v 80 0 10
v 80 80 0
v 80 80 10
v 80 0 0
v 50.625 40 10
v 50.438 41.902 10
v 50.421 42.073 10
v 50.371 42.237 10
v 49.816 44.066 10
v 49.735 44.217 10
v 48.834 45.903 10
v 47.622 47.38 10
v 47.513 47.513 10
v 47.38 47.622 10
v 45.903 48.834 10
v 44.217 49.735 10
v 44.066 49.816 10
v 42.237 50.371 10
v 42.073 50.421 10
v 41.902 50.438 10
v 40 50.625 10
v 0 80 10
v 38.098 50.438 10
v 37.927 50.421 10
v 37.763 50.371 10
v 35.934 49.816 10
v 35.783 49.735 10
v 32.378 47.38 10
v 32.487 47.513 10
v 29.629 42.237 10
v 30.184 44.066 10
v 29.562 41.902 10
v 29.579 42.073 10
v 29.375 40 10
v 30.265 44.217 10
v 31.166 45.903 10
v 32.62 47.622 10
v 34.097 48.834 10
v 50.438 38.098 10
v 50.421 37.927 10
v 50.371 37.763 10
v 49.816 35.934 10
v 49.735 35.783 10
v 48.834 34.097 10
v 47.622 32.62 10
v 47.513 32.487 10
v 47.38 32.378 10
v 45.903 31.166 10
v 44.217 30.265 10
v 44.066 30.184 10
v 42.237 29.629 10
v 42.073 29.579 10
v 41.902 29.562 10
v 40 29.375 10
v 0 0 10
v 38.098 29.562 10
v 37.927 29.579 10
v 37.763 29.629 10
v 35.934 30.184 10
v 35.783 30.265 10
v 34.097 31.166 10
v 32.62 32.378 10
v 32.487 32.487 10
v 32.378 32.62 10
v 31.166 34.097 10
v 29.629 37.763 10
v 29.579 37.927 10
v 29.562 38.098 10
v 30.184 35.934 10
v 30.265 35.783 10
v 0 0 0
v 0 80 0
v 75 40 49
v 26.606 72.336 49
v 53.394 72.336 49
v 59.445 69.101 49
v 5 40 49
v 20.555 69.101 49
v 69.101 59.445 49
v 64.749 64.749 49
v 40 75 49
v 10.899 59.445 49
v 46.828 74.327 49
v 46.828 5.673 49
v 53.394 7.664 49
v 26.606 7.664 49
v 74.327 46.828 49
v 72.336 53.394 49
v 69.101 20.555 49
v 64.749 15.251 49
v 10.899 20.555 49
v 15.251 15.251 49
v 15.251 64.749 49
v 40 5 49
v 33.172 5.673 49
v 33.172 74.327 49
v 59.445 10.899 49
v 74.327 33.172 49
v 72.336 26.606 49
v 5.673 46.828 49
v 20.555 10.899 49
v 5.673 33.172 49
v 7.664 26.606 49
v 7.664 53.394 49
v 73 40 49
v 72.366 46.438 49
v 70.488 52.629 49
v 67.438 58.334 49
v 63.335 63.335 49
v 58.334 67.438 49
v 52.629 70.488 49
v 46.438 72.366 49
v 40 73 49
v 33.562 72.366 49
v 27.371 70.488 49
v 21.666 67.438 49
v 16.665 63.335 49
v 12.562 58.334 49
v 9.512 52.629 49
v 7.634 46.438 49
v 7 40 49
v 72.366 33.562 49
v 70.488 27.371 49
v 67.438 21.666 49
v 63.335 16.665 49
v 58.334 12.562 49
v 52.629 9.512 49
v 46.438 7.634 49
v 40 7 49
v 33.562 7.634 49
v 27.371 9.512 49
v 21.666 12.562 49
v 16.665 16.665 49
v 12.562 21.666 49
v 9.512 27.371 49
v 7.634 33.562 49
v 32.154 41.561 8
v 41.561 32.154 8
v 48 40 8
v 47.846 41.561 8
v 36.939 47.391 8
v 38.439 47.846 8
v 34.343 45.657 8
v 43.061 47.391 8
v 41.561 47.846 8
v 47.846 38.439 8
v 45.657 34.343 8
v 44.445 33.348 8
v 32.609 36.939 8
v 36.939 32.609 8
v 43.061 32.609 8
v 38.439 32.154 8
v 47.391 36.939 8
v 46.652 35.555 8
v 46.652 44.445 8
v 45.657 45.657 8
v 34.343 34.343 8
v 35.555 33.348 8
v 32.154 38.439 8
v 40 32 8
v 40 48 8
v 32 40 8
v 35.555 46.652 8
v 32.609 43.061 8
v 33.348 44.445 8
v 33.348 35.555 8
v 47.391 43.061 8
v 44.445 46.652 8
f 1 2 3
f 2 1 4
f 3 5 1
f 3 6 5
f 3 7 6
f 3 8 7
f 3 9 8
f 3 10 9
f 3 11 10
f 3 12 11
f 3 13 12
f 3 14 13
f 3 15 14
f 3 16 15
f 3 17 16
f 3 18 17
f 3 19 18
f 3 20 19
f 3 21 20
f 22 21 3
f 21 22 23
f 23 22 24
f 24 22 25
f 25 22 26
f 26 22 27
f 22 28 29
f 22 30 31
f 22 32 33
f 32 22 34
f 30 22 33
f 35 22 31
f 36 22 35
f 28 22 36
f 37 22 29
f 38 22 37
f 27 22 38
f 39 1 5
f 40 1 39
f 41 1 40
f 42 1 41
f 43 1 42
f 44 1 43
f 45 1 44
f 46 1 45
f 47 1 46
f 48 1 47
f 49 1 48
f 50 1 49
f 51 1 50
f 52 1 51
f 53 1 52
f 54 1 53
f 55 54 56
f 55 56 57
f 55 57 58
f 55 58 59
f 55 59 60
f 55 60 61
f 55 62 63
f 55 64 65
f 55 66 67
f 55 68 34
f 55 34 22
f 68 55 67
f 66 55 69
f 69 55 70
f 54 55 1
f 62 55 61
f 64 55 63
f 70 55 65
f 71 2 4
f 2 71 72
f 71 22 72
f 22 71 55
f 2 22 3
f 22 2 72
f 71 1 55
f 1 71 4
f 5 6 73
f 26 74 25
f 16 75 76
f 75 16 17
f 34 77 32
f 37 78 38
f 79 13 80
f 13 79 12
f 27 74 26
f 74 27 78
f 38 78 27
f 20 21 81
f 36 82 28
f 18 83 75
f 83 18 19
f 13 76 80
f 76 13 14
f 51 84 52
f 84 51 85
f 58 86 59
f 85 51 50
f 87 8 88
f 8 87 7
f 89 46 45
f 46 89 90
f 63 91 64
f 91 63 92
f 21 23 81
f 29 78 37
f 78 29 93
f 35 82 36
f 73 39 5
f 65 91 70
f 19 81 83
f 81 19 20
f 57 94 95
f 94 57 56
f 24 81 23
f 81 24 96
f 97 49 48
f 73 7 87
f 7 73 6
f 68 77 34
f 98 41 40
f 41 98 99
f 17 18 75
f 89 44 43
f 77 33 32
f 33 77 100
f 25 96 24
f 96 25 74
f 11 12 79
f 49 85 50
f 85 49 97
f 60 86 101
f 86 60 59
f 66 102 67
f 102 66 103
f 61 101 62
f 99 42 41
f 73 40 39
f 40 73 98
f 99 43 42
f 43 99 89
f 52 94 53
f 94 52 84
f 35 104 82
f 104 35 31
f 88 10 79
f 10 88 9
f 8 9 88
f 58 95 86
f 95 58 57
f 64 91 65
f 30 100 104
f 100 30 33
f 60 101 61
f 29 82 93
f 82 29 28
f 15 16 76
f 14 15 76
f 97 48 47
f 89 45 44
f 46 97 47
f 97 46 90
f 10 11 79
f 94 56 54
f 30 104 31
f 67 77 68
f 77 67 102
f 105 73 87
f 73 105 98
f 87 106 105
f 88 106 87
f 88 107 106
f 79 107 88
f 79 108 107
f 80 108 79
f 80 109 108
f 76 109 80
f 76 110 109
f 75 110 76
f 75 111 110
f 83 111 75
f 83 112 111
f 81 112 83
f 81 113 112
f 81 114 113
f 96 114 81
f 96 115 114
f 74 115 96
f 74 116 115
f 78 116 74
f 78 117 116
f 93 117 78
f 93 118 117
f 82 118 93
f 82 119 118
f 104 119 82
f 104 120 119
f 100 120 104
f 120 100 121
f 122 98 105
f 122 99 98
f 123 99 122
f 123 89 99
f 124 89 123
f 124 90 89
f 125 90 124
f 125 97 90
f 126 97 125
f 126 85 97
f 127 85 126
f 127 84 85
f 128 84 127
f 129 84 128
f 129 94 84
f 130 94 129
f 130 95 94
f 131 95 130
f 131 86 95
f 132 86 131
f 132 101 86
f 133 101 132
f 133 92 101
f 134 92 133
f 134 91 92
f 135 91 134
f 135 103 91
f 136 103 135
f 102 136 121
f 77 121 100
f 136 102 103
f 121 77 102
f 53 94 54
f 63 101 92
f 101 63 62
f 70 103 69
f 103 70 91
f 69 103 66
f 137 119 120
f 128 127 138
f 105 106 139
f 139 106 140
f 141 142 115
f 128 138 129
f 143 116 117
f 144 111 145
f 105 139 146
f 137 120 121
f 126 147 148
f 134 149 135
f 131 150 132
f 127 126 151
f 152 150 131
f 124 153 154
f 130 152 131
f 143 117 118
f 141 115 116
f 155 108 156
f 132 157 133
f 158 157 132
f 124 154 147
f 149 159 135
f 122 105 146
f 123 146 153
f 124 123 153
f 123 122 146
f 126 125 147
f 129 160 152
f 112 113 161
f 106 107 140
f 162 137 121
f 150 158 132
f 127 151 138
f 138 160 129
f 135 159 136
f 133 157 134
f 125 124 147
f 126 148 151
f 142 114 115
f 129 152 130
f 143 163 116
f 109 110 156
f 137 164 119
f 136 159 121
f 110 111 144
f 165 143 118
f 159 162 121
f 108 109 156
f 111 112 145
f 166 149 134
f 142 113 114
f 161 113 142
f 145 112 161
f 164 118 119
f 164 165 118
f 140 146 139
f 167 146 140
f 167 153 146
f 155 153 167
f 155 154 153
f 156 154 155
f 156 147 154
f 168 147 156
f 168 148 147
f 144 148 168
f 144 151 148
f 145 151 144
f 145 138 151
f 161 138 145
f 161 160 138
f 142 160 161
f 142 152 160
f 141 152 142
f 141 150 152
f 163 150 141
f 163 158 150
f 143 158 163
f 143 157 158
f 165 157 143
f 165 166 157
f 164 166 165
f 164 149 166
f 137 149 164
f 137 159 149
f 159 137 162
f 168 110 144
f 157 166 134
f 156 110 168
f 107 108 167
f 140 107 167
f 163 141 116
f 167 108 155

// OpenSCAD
$fn = 32;

// ----------------------------------------------------------------------
// Hopper: funnel with square flange
// ----------------------------------------------------------------------

// --- parameters (mm) ---
fl = 80;                  // flange side, X and Y
fl_t = 10;                // flange thickness
cone_h = 40;              // cone height above the flange
top_d = 70;               // cone mouth diameter
bot_d = 20;               // cone spout diameter
wall = 2;                 // cone wall thickness

bore_d = bot_d - 2 * wall;  // spout bore diameter
total_h = fl_t + cone_h - 1;  // overall height

difference() {
  union() {
    cube([fl, fl, fl_t]);
    translate([fl / 2, fl / 2, fl_t - 1])
      cylinder(h = cone_h, d1 = bot_d, d2 = top_d);
  }
  translate([fl / 2, fl / 2, fl_t - 2])
    cylinder(h = cone_h + 1, d1 = bore_d, d2 = top_d - 2 * wall);
}
